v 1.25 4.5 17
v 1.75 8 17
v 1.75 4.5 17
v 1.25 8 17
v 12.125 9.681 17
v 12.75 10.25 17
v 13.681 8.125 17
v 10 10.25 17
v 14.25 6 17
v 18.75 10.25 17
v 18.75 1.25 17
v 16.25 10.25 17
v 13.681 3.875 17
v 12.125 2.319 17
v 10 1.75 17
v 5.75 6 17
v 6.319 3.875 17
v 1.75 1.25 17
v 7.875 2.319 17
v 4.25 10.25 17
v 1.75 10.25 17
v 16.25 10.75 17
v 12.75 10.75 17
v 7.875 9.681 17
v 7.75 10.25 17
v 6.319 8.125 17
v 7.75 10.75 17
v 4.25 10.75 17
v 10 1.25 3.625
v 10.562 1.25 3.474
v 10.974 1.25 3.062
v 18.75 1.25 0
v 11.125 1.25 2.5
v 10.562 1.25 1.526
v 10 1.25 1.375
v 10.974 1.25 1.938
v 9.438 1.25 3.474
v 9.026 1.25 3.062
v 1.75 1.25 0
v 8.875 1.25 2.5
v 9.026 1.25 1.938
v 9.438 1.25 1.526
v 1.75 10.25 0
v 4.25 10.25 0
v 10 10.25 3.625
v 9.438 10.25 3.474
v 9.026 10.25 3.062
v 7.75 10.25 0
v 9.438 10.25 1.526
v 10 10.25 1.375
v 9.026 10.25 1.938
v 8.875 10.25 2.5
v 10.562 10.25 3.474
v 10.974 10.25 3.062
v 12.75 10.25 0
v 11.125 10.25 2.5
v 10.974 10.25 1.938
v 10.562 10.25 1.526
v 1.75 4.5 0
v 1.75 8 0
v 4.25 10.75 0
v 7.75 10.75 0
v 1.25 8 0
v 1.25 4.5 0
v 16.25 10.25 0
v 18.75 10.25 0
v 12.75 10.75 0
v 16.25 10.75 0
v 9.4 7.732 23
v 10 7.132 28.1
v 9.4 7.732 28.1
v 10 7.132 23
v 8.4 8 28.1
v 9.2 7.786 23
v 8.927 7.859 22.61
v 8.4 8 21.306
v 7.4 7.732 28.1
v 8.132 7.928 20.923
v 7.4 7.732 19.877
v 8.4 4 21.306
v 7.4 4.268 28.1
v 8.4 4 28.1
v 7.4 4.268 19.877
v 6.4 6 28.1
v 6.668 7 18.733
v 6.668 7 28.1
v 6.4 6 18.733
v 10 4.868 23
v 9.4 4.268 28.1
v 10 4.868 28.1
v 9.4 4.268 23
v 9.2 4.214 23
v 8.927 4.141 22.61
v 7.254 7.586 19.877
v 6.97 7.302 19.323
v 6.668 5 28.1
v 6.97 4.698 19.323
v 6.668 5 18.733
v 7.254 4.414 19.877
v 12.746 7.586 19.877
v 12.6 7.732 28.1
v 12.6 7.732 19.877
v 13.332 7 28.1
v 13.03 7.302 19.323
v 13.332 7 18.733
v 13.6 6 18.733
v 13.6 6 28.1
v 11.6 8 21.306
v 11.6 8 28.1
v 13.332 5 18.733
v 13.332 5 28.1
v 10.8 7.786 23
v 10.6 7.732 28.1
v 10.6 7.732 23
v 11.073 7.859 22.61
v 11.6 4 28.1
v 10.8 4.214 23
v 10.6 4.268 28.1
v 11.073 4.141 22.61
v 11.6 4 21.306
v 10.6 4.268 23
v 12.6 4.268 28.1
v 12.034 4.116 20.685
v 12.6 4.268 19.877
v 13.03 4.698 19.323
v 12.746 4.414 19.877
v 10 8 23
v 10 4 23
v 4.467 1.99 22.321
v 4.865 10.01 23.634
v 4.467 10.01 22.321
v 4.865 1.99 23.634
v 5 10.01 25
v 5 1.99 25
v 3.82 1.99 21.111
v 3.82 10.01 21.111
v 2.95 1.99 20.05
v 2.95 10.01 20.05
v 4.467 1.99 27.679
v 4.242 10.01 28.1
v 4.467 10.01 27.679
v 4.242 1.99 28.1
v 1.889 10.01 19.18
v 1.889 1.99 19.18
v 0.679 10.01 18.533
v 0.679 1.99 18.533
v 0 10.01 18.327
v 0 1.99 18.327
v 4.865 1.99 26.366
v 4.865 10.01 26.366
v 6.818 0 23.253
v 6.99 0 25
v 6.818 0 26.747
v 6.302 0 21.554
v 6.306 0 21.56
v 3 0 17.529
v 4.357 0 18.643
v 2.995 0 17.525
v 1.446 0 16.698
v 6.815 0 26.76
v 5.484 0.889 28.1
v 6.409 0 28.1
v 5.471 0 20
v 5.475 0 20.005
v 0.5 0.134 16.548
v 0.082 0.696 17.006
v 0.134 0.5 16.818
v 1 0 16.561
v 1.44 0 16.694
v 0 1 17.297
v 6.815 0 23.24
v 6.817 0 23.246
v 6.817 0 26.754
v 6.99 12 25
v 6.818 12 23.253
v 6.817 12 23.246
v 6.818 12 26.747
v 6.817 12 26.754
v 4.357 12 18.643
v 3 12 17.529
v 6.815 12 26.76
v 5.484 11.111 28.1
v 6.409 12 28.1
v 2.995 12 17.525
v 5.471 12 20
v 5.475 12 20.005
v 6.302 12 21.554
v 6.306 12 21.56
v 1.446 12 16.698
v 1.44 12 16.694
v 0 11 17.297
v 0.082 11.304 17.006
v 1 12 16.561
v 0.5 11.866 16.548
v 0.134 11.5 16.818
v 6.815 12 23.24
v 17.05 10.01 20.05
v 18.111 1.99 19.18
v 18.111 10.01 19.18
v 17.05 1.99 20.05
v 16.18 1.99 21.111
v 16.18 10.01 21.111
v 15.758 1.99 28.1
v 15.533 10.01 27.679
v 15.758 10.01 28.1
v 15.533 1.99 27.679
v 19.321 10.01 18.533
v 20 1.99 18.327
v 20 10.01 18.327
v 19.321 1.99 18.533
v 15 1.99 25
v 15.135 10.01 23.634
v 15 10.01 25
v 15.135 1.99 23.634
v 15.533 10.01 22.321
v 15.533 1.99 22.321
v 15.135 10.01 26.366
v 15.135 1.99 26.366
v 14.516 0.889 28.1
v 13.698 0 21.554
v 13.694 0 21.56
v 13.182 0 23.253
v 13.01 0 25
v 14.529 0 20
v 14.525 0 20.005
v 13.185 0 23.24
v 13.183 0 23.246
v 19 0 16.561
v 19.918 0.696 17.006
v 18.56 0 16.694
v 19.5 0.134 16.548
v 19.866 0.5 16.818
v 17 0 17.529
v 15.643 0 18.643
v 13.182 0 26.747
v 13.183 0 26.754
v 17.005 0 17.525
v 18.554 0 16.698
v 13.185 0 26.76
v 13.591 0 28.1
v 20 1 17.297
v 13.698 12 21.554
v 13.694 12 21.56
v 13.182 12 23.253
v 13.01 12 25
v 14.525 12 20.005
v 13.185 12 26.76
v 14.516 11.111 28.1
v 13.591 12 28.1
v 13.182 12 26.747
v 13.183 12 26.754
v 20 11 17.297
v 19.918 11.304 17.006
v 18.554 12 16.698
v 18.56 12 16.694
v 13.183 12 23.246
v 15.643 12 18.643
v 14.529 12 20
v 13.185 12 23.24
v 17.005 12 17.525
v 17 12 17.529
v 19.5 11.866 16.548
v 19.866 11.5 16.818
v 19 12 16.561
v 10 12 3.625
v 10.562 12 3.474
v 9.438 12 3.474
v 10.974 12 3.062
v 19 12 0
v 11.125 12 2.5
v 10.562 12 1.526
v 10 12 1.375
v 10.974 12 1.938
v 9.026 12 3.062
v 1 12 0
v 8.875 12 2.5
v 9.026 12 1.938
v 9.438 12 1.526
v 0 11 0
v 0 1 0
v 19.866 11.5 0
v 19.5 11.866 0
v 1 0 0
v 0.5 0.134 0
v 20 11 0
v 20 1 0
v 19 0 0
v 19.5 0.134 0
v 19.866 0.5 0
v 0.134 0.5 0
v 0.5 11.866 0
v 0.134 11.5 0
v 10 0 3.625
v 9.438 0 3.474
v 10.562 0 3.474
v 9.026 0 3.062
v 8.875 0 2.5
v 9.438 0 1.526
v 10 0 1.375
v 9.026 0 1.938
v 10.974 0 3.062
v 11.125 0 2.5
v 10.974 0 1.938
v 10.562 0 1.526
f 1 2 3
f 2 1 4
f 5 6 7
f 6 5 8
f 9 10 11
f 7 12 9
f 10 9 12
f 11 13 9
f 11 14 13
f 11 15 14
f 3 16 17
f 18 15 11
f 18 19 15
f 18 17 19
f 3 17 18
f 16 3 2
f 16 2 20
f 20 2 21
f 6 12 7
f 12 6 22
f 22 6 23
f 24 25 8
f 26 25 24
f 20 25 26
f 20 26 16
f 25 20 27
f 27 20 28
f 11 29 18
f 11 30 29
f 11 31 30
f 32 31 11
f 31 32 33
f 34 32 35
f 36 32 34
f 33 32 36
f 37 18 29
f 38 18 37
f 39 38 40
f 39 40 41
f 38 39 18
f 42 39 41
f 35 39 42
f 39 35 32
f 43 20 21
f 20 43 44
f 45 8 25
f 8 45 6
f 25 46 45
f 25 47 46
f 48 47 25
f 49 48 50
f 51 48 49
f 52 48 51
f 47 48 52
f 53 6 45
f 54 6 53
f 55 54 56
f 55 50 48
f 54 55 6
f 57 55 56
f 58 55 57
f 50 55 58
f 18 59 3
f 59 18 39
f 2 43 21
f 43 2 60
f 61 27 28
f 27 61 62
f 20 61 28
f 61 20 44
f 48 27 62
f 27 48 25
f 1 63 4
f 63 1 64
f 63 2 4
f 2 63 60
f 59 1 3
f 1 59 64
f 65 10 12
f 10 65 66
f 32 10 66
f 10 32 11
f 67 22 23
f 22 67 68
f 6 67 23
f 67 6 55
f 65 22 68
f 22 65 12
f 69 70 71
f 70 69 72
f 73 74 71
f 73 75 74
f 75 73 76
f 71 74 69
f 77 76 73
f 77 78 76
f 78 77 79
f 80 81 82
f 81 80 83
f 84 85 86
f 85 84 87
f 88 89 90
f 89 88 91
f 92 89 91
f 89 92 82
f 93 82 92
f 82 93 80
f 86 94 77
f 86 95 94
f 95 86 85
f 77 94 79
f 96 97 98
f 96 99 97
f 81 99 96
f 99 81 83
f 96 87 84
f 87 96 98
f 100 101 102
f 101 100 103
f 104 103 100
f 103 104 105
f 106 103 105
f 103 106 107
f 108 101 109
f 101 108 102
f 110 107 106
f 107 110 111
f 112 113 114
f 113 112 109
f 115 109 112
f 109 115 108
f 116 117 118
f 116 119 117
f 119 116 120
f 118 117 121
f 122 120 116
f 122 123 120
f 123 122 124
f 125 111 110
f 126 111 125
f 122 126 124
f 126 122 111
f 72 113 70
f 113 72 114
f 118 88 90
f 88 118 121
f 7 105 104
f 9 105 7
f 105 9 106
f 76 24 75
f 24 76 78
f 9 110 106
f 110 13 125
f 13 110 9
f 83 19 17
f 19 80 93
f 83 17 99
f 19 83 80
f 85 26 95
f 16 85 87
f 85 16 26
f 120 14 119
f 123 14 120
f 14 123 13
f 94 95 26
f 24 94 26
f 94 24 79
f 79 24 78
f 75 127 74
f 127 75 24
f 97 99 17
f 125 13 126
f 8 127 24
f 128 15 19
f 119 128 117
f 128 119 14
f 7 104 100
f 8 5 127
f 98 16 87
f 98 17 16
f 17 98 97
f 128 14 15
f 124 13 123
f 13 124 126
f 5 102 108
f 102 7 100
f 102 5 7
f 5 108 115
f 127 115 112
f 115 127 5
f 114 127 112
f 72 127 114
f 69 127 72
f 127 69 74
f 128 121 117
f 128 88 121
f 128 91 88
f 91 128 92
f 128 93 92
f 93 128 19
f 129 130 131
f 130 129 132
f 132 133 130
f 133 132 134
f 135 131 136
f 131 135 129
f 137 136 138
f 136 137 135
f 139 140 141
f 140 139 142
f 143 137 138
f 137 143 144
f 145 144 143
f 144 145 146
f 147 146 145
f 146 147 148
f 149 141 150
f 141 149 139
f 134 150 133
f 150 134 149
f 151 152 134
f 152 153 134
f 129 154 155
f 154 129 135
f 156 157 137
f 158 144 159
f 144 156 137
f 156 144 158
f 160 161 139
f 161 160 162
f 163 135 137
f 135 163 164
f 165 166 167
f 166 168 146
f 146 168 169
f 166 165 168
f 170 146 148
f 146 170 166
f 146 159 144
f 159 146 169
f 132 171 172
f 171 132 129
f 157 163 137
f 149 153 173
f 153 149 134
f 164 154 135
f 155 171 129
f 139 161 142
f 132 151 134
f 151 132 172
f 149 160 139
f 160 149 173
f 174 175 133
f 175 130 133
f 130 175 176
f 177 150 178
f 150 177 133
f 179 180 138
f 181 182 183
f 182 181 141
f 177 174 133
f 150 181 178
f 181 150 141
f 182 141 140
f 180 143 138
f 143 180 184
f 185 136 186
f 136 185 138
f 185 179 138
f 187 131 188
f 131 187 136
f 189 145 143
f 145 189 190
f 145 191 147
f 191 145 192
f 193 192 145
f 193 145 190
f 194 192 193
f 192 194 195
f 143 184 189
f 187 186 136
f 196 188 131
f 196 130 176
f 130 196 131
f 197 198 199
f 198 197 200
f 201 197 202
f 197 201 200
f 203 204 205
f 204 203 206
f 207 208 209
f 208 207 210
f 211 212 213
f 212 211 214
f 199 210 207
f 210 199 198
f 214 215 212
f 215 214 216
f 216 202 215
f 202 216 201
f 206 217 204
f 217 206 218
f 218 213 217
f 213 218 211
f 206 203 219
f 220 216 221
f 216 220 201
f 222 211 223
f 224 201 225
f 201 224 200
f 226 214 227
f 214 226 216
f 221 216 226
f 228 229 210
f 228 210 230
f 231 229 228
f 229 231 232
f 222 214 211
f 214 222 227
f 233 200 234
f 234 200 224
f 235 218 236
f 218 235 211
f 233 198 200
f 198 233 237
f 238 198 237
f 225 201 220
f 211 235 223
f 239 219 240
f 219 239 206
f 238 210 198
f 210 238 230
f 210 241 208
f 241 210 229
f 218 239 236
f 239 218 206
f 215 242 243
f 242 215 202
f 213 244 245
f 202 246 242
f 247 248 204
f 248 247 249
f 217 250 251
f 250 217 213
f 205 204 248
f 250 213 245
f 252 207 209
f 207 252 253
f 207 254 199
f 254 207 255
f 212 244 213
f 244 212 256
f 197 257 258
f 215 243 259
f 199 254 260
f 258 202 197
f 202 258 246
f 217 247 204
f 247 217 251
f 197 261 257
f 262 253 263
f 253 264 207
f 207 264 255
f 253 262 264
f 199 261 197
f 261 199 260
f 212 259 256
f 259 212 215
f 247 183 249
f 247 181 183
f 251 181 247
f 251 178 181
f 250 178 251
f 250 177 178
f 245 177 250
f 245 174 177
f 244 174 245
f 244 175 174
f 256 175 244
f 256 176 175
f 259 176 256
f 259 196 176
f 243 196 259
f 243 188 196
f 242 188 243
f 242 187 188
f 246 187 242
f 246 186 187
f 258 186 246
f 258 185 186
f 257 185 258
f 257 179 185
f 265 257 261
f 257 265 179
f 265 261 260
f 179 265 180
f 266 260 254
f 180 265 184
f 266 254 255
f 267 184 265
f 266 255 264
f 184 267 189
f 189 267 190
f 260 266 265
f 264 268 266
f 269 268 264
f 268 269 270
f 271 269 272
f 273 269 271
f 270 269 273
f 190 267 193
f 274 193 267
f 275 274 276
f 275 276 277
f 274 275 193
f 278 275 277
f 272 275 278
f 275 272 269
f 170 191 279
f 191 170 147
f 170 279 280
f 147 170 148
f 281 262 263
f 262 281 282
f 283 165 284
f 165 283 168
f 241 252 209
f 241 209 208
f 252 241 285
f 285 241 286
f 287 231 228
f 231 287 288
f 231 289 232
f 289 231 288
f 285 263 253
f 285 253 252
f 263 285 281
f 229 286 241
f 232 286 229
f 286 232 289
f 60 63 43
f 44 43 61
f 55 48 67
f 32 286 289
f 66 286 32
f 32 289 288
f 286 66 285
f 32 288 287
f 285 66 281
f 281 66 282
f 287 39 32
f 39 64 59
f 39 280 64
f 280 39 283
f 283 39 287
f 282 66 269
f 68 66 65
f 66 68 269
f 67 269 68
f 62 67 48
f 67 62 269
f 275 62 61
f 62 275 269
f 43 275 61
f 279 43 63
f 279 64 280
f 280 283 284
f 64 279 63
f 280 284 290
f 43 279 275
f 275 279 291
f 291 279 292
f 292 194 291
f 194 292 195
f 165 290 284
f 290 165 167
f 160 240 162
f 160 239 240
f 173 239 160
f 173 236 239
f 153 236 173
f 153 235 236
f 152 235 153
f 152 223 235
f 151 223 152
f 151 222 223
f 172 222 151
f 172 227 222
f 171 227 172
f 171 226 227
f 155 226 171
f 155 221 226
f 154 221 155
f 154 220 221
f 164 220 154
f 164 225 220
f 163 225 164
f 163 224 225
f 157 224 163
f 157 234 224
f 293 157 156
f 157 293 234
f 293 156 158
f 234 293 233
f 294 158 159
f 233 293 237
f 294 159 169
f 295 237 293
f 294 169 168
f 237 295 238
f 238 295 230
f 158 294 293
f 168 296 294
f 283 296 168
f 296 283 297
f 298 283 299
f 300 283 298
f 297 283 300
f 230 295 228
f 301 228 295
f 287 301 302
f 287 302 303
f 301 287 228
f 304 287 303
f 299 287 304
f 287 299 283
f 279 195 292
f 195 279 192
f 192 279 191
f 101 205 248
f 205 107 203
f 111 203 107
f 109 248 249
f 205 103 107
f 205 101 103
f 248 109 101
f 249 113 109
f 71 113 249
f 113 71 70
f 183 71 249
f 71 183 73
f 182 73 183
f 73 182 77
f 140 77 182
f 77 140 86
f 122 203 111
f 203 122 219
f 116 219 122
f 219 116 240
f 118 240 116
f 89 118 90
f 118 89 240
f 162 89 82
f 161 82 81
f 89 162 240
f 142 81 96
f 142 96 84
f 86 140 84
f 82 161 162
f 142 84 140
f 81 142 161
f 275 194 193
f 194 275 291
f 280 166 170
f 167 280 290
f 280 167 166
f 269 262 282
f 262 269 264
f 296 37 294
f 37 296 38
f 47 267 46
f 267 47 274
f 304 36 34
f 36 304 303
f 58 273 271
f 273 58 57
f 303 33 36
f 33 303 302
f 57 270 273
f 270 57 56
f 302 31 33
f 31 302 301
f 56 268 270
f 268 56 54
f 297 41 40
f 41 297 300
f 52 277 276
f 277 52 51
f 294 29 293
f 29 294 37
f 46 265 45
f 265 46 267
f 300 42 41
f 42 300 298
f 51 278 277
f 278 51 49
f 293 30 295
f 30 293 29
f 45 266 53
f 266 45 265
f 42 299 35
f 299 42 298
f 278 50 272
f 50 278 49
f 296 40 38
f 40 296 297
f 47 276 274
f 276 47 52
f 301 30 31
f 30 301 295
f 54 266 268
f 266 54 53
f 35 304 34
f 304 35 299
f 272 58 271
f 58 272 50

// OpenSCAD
// This work is licensed under a Creative Commons Attribution-ShareAlike 3.0 Unported License.
// https://creativecommons.org/licenses/by-sa/3.0/

// how many pairs of PowerPoles?
pairCount = 1;
// how many cords? choose either 1, or the same as pairCount
cordCount = 1;
// diameter of hole where cord goes into plug
cordDiameter = 4;
// select 1 or 2 cords per pair (2 is good for "zip cord")
strandCount = 2;
// width of a single PowerPole; should be 8mm, but probably larger to compensate for your printer
powerPoleSquareSide = 8.5;
// diameter of roll pins to hold the PowerPoles in place; compensate for your printer
rollPinDiameter = 2.25;

module round4CornersCube(x,y,z,r) {
	translate([r, r, 0])
	minkowski() {
					cube([x - 2 * r, y - 2 * r, z]);
					cylinder(r=r, h=0.1);
	}
}

module powerPoleSingleCutout(){
	halfSide = powerPoleSquareSide / 2;
	module key(){
		translate([12.5,-1.75,-0.5]) cube([12.5,3.5,1]);
	}
	difference() {
		union() {
			cube([25,powerPoleSquareSide,powerPoleSquareSide + 0.5]);
			// proud keys
			translate([0,halfSide,0]) key();
			translate([0,powerPoleSquareSide,4]) rotate([90,0,0]) key();
		}
	}
}

module powerPoleWithExtendedKeys(){
	powerPoleHeight = 25;
	halfSide = powerPoleSquareSide / 2;
	module key(){
		translate([0,-1.75,-0.5]) cube([25,3.5,1]);
	}
	difference() {
		union() {
			cube([powerPoleHeight,powerPoleSquareSide,powerPoleSquareSide + 0.5]);
			// proud keys
			translate([0,halfSide,0]) key();
			translate([0,powerPoleSquareSide,4]) rotate([90,0,0]) key();
		}
	}
}

module fingerGripCutout(outerThickness) {
	$fn = 32;
	diameter = 14;
	rotate([-90, 0, 0])
		union() {
			cylinder(d=diameter, h=outerThickness);
			translate([0, 0, -0.01])
			cylinder(d2=diameter, d1=diameter + 4, h=2);
			translate([0, 0, outerThickness - 1.99])
				cylinder(d1=diameter, d2=diameter + 4, h=2);
		}
}

module cordCutout(plugWidth, offset, z) {
	translate([plugWidth / 2, offset, z])
		cylinder(d2=cordDiameter, d1=powerPoleSquareSide, h=6);
	if (strandCount == 2) {
		translate([plugWidth / 2 - cordDiameter * 0.4, offset, 0])
			cylinder(d=cordDiameter, h=100);
		translate([plugWidth / 2 + cordDiameter * 0.4, offset, 0])
			cylinder(d=cordDiameter, h=100);
	} else {
		translate([plugWidth / 2, offset, 0])
			cylinder(d=cordDiameter, h=100);
	}
}

module plugBody() {
	// outer dimensions
	width = 20;
	endThickness = 1.75; // 1.75 * 2 + 8.5 = 12mm total thickness for one PowerPole pair
	cornerRadius = 1;
	$fn = 12;
	// depth dimensions
	flangeDepth = 5;
	keyDepth = 12;
	powerPoleHeight = 25;
	powerPoleCenterOffset = endThickness - powerPoleSquareSide / 2;

	outerThickness = endThickness * 2 + powerPoleSquareSide * pairCount;
	difference() {
		round4CornersCube(width, outerThickness, keyDepth + flangeDepth + 11, cornerRadius);
		for (i = [1:pairCount]) {
			translate([endThickness + powerPoleSquareSide, endThickness + powerPoleSquareSide * i, flangeDepth + keyDepth - powerPoleHeight])
				rotate([0, -90, 90])
					powerPoleWithExtendedKeys();
			translate([endThickness + powerPoleSquareSide * 2, endThickness + powerPoleSquareSide * i, flangeDepth + keyDepth - powerPoleHeight])
				rotate([0, -90, 90])
					powerPoleWithExtendedKeys();
			if (pairCount == cordCount)
				cordCutout(width, powerPoleCenterOffset + powerPoleSquareSide * i, keyDepth + flangeDepth);
		}
		if (cordCount == 1) {
			cordCutout(width, outerThickness / 2, keyDepth + flangeDepth);
			if (pairCount > 1)
				translate([(width - 8) / 2, endThickness, keyDepth + flangeDepth])
					round4CornersCube(8, pairCount * powerPoleSquareSide, 8, 3.9);
		}
		translate([-2, 0, keyDepth + flangeDepth + 8])
			fingerGripCutout(outerThickness);
		translate([width + 2, 0, keyDepth + flangeDepth + 8])
			fingerGripCutout(outerThickness);
		translate([width / 2, 0, flangeDepth / 2])
			rotate([-90, 0, 0])
				cylinder(d=rollPinDiameter, h=100);
	}
}

plugBody();
